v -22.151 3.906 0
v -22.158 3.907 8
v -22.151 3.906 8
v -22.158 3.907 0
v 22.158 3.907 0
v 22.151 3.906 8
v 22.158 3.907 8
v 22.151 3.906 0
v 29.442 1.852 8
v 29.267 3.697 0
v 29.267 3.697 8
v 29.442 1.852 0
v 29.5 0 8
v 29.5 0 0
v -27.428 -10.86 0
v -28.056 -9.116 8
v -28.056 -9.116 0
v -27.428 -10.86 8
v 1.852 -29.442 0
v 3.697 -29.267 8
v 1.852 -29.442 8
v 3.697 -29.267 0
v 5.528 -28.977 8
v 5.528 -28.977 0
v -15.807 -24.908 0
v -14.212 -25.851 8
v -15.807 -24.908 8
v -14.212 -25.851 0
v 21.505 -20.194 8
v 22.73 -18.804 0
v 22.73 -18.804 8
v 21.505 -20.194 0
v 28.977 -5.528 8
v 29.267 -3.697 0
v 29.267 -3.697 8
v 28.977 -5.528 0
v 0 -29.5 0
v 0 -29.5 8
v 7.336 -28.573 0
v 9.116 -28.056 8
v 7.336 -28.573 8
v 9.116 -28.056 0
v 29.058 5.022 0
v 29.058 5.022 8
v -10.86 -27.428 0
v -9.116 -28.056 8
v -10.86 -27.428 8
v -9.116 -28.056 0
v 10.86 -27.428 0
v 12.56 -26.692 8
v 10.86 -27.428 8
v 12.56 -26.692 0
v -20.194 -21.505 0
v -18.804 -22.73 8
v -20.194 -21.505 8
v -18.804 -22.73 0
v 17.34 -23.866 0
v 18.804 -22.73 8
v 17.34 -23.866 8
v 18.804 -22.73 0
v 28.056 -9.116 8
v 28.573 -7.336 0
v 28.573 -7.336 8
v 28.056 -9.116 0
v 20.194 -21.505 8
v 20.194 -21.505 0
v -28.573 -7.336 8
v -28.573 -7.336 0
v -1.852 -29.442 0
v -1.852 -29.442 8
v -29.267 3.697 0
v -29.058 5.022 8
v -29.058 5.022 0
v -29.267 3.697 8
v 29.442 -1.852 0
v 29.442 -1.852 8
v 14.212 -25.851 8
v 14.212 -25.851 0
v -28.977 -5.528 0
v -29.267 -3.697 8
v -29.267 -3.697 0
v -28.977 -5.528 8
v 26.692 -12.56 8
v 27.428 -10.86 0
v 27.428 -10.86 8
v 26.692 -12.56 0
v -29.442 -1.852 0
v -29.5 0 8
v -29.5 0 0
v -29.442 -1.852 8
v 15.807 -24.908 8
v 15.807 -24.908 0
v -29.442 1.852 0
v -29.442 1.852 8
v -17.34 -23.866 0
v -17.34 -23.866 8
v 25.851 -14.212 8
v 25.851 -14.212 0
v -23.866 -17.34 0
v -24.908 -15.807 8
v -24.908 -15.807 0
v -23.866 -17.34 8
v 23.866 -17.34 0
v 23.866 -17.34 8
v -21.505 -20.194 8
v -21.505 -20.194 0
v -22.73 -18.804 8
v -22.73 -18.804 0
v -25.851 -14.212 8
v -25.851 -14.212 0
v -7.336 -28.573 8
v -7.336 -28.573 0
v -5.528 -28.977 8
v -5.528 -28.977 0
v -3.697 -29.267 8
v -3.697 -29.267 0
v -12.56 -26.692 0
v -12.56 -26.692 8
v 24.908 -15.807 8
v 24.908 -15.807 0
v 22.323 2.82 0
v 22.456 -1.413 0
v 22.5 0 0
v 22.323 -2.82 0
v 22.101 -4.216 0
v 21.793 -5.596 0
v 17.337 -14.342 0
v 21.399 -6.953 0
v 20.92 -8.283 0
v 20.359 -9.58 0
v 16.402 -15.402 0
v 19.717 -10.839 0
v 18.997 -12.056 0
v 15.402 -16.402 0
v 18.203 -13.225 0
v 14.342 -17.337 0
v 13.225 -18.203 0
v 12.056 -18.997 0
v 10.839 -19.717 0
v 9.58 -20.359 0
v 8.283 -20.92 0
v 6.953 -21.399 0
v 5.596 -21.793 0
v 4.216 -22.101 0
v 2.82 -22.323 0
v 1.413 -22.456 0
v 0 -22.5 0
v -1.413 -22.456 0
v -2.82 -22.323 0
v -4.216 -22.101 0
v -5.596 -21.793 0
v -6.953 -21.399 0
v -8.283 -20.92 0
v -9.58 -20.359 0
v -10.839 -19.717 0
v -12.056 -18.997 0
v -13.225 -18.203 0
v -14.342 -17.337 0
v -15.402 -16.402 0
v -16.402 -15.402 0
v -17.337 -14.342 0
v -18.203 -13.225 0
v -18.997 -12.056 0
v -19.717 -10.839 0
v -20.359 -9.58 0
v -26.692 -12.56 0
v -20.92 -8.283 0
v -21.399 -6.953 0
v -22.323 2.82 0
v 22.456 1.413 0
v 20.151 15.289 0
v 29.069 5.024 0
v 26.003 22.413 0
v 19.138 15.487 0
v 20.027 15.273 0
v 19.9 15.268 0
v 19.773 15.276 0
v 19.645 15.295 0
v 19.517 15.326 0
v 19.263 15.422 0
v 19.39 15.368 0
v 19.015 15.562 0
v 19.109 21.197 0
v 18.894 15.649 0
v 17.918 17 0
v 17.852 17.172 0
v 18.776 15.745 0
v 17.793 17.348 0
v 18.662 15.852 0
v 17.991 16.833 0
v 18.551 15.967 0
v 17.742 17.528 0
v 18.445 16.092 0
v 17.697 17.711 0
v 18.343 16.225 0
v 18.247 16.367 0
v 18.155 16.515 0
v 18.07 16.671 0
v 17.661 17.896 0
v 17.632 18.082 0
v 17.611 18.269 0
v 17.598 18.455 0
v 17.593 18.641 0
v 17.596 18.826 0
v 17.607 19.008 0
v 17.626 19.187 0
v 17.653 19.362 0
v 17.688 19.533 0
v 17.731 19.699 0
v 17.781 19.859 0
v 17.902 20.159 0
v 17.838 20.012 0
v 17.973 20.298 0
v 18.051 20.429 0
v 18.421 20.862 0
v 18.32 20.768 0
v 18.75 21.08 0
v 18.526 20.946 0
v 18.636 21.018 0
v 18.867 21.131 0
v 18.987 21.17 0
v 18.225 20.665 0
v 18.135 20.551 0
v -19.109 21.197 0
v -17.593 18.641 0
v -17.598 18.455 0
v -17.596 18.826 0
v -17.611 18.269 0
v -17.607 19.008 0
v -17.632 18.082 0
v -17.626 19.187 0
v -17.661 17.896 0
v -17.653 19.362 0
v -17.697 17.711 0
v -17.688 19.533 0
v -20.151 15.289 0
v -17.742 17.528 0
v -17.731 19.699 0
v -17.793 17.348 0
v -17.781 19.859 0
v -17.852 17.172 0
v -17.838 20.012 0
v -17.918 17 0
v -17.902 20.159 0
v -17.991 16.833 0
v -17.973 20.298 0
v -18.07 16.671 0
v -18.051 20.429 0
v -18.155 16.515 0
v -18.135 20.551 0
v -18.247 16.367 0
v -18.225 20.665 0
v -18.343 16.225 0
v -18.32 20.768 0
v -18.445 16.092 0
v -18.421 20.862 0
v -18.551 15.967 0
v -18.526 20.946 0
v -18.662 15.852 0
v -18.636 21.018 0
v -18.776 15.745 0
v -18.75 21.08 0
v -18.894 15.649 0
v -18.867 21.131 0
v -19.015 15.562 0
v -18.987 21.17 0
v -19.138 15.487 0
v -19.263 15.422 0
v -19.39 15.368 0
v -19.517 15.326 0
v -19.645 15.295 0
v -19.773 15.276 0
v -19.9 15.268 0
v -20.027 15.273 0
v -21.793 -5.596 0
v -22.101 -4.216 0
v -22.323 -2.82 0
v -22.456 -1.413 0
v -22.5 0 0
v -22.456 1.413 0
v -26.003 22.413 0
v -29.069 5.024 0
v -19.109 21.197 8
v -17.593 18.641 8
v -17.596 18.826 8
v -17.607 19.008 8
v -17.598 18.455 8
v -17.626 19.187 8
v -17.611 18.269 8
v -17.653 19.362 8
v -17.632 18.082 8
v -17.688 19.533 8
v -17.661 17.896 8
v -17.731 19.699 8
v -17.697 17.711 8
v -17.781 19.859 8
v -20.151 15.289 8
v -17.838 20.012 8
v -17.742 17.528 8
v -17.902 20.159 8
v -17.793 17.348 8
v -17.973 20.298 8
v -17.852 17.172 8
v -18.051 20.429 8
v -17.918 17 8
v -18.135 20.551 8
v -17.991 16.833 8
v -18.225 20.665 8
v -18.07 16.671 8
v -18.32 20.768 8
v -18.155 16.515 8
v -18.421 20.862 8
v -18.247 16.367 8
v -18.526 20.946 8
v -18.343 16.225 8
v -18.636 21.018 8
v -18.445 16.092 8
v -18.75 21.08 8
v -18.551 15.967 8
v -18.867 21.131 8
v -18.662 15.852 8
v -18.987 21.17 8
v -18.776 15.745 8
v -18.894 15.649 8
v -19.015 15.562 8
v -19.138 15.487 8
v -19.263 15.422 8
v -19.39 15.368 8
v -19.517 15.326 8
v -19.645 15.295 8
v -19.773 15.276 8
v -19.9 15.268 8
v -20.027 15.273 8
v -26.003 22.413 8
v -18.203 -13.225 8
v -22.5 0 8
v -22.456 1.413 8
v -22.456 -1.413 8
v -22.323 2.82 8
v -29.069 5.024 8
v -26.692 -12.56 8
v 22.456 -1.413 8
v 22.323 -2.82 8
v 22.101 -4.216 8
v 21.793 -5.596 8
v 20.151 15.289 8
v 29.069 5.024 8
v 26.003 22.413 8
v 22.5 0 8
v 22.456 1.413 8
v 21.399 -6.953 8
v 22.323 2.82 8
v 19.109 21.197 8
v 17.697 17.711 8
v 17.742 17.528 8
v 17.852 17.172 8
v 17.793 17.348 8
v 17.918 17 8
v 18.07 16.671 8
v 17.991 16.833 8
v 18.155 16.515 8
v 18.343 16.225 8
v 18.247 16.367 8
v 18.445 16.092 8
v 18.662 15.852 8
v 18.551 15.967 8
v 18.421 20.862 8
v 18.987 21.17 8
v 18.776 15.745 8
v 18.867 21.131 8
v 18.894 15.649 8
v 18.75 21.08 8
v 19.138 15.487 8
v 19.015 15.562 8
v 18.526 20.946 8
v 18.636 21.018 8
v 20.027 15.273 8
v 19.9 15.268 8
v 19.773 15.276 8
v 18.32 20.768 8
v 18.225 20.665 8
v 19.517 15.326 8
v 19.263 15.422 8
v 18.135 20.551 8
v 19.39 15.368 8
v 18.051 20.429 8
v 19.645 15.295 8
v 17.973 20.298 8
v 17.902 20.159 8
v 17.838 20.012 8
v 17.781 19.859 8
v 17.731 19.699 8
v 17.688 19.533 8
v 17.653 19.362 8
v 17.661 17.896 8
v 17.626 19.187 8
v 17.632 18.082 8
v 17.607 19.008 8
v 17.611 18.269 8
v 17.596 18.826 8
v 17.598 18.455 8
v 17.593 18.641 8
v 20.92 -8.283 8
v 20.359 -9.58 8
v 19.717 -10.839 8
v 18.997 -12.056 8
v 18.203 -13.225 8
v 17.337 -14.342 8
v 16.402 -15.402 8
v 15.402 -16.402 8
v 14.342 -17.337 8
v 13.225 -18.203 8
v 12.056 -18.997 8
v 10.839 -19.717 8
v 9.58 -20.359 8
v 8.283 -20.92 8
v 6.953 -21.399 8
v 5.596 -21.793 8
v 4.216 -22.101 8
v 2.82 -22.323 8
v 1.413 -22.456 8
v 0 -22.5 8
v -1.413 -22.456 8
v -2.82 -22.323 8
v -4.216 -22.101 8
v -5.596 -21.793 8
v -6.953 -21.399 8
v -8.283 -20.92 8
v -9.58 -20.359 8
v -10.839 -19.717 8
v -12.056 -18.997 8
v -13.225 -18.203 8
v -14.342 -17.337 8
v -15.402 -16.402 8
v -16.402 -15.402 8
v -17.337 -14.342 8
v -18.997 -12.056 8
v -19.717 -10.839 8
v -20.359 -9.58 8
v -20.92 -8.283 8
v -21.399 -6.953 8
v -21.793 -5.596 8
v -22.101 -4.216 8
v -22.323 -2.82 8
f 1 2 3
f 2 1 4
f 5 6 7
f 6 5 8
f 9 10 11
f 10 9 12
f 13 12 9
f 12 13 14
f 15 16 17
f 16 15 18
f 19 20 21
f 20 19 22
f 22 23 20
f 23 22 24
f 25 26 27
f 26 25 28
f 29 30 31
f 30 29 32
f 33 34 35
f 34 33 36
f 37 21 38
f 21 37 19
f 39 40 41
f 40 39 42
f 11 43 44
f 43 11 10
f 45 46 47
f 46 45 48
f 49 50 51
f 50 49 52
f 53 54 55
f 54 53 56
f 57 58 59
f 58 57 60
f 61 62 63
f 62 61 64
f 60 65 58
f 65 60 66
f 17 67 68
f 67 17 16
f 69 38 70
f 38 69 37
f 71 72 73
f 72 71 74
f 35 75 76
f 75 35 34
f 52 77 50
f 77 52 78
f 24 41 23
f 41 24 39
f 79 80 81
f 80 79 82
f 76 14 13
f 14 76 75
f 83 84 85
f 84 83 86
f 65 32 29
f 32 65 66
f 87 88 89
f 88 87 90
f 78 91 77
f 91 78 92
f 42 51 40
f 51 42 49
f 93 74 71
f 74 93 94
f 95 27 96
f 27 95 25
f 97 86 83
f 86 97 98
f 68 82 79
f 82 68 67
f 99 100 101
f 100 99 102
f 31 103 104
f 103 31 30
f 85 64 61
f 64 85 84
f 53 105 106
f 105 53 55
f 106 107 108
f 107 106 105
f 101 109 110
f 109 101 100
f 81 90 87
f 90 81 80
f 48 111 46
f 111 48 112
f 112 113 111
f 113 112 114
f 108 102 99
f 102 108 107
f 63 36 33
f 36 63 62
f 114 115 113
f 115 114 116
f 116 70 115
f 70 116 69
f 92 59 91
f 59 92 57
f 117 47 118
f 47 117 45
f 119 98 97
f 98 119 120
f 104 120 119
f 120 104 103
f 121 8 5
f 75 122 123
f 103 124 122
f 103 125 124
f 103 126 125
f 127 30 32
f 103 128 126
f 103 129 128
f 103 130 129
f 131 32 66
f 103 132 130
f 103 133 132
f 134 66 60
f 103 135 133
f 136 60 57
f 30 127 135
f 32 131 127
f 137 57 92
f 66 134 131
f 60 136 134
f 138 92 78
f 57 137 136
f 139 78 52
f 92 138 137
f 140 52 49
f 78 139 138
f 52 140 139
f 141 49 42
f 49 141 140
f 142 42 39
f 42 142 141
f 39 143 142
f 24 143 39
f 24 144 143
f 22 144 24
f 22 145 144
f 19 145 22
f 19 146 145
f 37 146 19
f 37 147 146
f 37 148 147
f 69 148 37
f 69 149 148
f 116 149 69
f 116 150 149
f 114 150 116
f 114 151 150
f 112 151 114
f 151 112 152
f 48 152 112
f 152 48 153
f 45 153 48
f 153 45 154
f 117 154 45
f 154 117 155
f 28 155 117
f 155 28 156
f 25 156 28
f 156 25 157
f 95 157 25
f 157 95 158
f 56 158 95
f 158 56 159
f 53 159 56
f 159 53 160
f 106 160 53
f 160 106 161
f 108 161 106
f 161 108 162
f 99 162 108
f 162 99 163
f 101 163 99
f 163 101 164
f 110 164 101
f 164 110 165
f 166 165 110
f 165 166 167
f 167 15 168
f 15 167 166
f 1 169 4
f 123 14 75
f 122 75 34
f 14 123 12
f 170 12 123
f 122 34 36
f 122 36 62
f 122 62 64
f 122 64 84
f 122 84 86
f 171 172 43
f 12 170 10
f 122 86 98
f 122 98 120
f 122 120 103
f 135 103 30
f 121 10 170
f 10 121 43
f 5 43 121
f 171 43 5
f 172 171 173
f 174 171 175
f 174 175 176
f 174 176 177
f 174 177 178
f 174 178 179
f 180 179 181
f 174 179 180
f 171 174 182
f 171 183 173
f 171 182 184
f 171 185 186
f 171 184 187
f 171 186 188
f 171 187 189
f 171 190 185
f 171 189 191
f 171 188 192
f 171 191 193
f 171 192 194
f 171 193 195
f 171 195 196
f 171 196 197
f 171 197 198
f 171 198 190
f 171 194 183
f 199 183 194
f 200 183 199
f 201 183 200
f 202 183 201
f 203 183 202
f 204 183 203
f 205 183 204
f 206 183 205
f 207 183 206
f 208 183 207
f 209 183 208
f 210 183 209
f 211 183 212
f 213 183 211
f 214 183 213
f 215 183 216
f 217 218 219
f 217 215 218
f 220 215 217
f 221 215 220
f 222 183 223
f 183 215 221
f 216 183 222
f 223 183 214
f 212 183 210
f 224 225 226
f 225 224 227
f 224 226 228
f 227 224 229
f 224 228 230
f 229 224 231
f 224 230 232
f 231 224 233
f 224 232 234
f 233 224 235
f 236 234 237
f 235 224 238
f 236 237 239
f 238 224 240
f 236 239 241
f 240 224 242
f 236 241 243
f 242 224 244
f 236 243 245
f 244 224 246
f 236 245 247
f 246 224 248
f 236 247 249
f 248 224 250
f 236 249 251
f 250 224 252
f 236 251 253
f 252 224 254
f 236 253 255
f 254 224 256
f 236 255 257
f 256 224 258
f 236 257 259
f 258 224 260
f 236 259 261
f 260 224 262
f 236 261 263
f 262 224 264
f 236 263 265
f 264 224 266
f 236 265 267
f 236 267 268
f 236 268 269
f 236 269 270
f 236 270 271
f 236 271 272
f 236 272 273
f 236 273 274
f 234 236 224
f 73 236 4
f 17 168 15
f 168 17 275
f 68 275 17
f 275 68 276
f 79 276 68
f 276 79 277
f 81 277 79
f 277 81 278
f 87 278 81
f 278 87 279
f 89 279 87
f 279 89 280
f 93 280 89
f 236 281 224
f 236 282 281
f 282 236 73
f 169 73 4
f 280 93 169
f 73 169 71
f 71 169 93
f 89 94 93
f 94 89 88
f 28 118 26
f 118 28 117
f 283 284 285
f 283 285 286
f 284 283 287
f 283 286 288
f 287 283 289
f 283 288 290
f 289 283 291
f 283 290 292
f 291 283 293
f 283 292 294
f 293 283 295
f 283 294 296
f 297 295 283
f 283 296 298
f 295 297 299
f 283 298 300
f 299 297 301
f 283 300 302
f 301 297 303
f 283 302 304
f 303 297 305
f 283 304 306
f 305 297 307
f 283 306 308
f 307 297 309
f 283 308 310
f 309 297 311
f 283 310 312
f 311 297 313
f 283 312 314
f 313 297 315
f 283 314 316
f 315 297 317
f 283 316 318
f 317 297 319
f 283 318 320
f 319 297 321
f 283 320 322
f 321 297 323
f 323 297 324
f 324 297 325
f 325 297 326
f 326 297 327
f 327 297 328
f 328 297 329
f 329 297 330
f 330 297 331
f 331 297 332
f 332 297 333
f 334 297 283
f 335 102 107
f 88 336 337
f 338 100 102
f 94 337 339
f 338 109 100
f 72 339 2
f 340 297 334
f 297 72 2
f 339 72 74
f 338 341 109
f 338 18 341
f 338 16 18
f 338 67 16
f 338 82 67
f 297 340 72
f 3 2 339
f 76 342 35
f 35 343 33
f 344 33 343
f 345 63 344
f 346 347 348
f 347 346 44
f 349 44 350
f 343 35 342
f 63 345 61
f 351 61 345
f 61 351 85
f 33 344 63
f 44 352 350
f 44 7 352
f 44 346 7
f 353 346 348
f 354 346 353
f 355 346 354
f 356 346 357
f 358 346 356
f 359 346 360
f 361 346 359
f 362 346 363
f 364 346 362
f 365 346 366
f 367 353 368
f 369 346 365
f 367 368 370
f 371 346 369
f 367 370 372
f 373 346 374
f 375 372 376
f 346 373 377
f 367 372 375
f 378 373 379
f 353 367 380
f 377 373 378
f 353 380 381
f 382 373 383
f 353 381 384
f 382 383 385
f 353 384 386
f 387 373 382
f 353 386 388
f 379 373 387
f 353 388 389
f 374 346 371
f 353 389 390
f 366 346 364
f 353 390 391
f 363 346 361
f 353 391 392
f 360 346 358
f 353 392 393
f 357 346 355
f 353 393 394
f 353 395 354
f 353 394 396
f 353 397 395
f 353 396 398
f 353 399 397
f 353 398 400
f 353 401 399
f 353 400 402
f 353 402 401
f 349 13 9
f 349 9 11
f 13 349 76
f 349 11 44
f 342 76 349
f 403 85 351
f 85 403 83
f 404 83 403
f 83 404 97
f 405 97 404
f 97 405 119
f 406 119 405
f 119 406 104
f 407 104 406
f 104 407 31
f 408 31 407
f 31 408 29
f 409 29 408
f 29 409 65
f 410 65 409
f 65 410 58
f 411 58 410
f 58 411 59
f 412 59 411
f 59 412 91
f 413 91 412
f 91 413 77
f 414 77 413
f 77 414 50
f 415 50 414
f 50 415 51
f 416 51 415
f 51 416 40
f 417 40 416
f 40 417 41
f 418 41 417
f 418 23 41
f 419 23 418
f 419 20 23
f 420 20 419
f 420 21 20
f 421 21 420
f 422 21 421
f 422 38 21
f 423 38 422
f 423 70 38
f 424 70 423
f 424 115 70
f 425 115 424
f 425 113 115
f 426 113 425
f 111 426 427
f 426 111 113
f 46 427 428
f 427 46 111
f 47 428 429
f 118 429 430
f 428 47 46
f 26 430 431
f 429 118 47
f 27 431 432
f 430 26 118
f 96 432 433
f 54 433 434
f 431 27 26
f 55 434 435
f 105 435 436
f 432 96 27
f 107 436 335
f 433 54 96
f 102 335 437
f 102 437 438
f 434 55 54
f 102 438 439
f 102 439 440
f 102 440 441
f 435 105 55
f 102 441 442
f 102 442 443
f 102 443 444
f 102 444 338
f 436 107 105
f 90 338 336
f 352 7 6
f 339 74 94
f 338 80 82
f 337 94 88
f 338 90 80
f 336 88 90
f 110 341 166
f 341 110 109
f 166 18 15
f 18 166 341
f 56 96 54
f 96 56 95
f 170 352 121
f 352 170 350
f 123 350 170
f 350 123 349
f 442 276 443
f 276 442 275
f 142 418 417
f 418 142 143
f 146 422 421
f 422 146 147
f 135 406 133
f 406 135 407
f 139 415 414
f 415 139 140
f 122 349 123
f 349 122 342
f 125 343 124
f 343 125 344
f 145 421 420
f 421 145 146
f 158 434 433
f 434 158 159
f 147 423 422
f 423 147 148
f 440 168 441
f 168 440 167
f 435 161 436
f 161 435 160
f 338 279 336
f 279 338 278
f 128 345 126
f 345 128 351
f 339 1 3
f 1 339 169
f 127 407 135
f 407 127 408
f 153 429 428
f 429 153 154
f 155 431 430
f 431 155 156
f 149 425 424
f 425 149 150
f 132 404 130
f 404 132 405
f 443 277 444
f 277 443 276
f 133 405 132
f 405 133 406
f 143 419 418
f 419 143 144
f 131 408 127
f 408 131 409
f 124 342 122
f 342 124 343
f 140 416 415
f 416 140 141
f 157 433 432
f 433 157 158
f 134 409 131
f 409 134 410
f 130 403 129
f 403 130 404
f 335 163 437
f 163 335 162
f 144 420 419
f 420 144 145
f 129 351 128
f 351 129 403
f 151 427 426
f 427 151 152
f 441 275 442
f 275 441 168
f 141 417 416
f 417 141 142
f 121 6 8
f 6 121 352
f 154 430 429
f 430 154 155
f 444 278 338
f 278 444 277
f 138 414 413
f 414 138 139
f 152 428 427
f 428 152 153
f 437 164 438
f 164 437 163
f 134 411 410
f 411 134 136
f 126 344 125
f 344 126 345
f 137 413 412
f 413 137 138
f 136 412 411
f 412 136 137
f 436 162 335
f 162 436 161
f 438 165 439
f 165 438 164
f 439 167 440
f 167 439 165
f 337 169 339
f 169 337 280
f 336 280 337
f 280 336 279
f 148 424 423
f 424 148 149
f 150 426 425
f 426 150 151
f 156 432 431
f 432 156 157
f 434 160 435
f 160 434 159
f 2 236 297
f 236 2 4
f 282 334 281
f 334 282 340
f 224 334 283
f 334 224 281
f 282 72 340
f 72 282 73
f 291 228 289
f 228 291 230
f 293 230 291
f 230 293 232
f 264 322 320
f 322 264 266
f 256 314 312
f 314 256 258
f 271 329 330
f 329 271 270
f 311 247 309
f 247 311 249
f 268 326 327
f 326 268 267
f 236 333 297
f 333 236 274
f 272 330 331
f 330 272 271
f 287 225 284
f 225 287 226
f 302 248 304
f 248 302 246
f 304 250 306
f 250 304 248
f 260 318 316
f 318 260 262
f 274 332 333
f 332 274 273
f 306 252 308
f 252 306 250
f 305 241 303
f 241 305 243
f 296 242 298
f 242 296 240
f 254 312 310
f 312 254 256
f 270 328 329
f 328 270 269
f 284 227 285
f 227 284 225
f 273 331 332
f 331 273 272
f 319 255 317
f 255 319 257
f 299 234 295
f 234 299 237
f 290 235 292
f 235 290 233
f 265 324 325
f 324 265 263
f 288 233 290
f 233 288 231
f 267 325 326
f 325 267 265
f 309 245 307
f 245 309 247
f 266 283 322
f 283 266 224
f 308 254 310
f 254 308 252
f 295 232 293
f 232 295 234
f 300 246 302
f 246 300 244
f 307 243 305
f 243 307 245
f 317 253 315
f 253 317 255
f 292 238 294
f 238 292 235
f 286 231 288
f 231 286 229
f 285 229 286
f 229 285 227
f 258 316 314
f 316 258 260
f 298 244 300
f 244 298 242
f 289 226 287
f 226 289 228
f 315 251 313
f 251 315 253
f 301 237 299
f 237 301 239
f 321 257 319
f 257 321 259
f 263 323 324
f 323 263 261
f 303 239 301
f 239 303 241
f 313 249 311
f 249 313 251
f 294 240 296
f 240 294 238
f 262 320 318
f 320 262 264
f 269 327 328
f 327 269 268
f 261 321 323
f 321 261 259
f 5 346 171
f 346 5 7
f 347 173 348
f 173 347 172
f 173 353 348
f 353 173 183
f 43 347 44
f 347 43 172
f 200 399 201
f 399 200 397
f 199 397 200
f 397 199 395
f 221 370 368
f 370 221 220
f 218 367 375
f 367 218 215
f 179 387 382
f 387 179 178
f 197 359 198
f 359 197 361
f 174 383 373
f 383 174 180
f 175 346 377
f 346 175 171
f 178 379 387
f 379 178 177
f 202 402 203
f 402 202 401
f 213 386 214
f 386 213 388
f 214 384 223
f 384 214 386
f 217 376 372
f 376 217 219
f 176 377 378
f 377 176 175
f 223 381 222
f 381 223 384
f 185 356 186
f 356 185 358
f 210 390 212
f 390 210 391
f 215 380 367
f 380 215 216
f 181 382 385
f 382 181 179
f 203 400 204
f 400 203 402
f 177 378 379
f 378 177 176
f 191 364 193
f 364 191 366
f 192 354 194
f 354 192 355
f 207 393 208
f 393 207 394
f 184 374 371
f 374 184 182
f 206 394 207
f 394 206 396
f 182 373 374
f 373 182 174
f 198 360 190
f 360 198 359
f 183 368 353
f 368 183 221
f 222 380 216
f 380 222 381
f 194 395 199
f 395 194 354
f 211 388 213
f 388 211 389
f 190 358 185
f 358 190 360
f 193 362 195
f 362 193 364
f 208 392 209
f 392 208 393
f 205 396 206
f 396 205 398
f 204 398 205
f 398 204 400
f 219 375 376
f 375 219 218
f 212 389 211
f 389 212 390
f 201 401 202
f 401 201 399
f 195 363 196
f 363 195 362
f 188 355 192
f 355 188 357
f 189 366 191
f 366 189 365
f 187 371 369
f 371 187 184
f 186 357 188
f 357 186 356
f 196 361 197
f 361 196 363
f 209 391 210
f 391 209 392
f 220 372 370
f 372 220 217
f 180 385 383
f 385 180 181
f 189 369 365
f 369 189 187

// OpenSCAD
TOL = 0.1;

// Calculate how long the side length should be 
// for a rounded rectangle of a given perimeter
// with a known end radius...
function calcSideLength(perimeter, radius) = (perimeter - (6.2831853071 * radius)) / 2.0;

module clipProng(wall, length, thickness) {
	baseKnob = 2;
	baseScale = 1.5;

	baseThumb = 37.5;

	union() {
		cube([wall, length, thickness]);

		/*
		translate([0,-baseThumb, 0]) {
			cube([wall, baseThumb, thickness]);
			translate([(wall / 2.0),0,0]) cylinder(h = (thickness), r = (wall / 2.0), center = false, $fn = 100);
		}
		*/

		translate([wall,(length - (baseKnob * baseScale)),0]) scale([1,baseScale,1]) cylinder(h = (thickness), r = (baseKnob), center = false, $fn = 100);			 
	}

}

module clip(angle, perimeter, thickness) {
	baseRadius = (perimeter / 10.0) - 3.5;
	baseSide   = (calcSideLength(perimeter, baseRadius) / 2.0) - 12;
	baseWall = 7;

	union() {
		difference() {
			cylinder(h = (thickness), r = (baseRadius + baseWall), center = false, $fn = 100);
			translate([0,0,-TOL]) cylinder(h = (thickness + (TOL * 2.0)), r = (baseRadius), center = false, $fn = 100);

			union() {
				rotate([0,0,-angle]) translate([-(baseRadius + baseWall), 0,-TOL]) {
					cube([(baseRadius + baseWall), (baseSide * 10), (thickness + (TOL * 2.0))]);
				}

				rotate([0,0,angle]) translate([0, 0,-TOL]) {
					cube([(baseRadius + baseWall), (baseSide * 10), (thickness + (TOL * 2.0))]);
				}
			}
		}

		union() {
			rotate([0,0,-angle]) translate([-(baseRadius + baseWall), -TOL,0]) {
				clipProng(baseWall, baseSide, thickness);
			}
			rotate([0,0,angle]) translate([(baseRadius + baseWall), -TOL,0]) {
				rotate([0,180,0]) translate([0,0, -thickness]) clipProng(baseWall, baseSide, thickness);
			}
		}
	}
}

// Make a clip with a given degree of tension built in
clip(10, 260, 8); 
